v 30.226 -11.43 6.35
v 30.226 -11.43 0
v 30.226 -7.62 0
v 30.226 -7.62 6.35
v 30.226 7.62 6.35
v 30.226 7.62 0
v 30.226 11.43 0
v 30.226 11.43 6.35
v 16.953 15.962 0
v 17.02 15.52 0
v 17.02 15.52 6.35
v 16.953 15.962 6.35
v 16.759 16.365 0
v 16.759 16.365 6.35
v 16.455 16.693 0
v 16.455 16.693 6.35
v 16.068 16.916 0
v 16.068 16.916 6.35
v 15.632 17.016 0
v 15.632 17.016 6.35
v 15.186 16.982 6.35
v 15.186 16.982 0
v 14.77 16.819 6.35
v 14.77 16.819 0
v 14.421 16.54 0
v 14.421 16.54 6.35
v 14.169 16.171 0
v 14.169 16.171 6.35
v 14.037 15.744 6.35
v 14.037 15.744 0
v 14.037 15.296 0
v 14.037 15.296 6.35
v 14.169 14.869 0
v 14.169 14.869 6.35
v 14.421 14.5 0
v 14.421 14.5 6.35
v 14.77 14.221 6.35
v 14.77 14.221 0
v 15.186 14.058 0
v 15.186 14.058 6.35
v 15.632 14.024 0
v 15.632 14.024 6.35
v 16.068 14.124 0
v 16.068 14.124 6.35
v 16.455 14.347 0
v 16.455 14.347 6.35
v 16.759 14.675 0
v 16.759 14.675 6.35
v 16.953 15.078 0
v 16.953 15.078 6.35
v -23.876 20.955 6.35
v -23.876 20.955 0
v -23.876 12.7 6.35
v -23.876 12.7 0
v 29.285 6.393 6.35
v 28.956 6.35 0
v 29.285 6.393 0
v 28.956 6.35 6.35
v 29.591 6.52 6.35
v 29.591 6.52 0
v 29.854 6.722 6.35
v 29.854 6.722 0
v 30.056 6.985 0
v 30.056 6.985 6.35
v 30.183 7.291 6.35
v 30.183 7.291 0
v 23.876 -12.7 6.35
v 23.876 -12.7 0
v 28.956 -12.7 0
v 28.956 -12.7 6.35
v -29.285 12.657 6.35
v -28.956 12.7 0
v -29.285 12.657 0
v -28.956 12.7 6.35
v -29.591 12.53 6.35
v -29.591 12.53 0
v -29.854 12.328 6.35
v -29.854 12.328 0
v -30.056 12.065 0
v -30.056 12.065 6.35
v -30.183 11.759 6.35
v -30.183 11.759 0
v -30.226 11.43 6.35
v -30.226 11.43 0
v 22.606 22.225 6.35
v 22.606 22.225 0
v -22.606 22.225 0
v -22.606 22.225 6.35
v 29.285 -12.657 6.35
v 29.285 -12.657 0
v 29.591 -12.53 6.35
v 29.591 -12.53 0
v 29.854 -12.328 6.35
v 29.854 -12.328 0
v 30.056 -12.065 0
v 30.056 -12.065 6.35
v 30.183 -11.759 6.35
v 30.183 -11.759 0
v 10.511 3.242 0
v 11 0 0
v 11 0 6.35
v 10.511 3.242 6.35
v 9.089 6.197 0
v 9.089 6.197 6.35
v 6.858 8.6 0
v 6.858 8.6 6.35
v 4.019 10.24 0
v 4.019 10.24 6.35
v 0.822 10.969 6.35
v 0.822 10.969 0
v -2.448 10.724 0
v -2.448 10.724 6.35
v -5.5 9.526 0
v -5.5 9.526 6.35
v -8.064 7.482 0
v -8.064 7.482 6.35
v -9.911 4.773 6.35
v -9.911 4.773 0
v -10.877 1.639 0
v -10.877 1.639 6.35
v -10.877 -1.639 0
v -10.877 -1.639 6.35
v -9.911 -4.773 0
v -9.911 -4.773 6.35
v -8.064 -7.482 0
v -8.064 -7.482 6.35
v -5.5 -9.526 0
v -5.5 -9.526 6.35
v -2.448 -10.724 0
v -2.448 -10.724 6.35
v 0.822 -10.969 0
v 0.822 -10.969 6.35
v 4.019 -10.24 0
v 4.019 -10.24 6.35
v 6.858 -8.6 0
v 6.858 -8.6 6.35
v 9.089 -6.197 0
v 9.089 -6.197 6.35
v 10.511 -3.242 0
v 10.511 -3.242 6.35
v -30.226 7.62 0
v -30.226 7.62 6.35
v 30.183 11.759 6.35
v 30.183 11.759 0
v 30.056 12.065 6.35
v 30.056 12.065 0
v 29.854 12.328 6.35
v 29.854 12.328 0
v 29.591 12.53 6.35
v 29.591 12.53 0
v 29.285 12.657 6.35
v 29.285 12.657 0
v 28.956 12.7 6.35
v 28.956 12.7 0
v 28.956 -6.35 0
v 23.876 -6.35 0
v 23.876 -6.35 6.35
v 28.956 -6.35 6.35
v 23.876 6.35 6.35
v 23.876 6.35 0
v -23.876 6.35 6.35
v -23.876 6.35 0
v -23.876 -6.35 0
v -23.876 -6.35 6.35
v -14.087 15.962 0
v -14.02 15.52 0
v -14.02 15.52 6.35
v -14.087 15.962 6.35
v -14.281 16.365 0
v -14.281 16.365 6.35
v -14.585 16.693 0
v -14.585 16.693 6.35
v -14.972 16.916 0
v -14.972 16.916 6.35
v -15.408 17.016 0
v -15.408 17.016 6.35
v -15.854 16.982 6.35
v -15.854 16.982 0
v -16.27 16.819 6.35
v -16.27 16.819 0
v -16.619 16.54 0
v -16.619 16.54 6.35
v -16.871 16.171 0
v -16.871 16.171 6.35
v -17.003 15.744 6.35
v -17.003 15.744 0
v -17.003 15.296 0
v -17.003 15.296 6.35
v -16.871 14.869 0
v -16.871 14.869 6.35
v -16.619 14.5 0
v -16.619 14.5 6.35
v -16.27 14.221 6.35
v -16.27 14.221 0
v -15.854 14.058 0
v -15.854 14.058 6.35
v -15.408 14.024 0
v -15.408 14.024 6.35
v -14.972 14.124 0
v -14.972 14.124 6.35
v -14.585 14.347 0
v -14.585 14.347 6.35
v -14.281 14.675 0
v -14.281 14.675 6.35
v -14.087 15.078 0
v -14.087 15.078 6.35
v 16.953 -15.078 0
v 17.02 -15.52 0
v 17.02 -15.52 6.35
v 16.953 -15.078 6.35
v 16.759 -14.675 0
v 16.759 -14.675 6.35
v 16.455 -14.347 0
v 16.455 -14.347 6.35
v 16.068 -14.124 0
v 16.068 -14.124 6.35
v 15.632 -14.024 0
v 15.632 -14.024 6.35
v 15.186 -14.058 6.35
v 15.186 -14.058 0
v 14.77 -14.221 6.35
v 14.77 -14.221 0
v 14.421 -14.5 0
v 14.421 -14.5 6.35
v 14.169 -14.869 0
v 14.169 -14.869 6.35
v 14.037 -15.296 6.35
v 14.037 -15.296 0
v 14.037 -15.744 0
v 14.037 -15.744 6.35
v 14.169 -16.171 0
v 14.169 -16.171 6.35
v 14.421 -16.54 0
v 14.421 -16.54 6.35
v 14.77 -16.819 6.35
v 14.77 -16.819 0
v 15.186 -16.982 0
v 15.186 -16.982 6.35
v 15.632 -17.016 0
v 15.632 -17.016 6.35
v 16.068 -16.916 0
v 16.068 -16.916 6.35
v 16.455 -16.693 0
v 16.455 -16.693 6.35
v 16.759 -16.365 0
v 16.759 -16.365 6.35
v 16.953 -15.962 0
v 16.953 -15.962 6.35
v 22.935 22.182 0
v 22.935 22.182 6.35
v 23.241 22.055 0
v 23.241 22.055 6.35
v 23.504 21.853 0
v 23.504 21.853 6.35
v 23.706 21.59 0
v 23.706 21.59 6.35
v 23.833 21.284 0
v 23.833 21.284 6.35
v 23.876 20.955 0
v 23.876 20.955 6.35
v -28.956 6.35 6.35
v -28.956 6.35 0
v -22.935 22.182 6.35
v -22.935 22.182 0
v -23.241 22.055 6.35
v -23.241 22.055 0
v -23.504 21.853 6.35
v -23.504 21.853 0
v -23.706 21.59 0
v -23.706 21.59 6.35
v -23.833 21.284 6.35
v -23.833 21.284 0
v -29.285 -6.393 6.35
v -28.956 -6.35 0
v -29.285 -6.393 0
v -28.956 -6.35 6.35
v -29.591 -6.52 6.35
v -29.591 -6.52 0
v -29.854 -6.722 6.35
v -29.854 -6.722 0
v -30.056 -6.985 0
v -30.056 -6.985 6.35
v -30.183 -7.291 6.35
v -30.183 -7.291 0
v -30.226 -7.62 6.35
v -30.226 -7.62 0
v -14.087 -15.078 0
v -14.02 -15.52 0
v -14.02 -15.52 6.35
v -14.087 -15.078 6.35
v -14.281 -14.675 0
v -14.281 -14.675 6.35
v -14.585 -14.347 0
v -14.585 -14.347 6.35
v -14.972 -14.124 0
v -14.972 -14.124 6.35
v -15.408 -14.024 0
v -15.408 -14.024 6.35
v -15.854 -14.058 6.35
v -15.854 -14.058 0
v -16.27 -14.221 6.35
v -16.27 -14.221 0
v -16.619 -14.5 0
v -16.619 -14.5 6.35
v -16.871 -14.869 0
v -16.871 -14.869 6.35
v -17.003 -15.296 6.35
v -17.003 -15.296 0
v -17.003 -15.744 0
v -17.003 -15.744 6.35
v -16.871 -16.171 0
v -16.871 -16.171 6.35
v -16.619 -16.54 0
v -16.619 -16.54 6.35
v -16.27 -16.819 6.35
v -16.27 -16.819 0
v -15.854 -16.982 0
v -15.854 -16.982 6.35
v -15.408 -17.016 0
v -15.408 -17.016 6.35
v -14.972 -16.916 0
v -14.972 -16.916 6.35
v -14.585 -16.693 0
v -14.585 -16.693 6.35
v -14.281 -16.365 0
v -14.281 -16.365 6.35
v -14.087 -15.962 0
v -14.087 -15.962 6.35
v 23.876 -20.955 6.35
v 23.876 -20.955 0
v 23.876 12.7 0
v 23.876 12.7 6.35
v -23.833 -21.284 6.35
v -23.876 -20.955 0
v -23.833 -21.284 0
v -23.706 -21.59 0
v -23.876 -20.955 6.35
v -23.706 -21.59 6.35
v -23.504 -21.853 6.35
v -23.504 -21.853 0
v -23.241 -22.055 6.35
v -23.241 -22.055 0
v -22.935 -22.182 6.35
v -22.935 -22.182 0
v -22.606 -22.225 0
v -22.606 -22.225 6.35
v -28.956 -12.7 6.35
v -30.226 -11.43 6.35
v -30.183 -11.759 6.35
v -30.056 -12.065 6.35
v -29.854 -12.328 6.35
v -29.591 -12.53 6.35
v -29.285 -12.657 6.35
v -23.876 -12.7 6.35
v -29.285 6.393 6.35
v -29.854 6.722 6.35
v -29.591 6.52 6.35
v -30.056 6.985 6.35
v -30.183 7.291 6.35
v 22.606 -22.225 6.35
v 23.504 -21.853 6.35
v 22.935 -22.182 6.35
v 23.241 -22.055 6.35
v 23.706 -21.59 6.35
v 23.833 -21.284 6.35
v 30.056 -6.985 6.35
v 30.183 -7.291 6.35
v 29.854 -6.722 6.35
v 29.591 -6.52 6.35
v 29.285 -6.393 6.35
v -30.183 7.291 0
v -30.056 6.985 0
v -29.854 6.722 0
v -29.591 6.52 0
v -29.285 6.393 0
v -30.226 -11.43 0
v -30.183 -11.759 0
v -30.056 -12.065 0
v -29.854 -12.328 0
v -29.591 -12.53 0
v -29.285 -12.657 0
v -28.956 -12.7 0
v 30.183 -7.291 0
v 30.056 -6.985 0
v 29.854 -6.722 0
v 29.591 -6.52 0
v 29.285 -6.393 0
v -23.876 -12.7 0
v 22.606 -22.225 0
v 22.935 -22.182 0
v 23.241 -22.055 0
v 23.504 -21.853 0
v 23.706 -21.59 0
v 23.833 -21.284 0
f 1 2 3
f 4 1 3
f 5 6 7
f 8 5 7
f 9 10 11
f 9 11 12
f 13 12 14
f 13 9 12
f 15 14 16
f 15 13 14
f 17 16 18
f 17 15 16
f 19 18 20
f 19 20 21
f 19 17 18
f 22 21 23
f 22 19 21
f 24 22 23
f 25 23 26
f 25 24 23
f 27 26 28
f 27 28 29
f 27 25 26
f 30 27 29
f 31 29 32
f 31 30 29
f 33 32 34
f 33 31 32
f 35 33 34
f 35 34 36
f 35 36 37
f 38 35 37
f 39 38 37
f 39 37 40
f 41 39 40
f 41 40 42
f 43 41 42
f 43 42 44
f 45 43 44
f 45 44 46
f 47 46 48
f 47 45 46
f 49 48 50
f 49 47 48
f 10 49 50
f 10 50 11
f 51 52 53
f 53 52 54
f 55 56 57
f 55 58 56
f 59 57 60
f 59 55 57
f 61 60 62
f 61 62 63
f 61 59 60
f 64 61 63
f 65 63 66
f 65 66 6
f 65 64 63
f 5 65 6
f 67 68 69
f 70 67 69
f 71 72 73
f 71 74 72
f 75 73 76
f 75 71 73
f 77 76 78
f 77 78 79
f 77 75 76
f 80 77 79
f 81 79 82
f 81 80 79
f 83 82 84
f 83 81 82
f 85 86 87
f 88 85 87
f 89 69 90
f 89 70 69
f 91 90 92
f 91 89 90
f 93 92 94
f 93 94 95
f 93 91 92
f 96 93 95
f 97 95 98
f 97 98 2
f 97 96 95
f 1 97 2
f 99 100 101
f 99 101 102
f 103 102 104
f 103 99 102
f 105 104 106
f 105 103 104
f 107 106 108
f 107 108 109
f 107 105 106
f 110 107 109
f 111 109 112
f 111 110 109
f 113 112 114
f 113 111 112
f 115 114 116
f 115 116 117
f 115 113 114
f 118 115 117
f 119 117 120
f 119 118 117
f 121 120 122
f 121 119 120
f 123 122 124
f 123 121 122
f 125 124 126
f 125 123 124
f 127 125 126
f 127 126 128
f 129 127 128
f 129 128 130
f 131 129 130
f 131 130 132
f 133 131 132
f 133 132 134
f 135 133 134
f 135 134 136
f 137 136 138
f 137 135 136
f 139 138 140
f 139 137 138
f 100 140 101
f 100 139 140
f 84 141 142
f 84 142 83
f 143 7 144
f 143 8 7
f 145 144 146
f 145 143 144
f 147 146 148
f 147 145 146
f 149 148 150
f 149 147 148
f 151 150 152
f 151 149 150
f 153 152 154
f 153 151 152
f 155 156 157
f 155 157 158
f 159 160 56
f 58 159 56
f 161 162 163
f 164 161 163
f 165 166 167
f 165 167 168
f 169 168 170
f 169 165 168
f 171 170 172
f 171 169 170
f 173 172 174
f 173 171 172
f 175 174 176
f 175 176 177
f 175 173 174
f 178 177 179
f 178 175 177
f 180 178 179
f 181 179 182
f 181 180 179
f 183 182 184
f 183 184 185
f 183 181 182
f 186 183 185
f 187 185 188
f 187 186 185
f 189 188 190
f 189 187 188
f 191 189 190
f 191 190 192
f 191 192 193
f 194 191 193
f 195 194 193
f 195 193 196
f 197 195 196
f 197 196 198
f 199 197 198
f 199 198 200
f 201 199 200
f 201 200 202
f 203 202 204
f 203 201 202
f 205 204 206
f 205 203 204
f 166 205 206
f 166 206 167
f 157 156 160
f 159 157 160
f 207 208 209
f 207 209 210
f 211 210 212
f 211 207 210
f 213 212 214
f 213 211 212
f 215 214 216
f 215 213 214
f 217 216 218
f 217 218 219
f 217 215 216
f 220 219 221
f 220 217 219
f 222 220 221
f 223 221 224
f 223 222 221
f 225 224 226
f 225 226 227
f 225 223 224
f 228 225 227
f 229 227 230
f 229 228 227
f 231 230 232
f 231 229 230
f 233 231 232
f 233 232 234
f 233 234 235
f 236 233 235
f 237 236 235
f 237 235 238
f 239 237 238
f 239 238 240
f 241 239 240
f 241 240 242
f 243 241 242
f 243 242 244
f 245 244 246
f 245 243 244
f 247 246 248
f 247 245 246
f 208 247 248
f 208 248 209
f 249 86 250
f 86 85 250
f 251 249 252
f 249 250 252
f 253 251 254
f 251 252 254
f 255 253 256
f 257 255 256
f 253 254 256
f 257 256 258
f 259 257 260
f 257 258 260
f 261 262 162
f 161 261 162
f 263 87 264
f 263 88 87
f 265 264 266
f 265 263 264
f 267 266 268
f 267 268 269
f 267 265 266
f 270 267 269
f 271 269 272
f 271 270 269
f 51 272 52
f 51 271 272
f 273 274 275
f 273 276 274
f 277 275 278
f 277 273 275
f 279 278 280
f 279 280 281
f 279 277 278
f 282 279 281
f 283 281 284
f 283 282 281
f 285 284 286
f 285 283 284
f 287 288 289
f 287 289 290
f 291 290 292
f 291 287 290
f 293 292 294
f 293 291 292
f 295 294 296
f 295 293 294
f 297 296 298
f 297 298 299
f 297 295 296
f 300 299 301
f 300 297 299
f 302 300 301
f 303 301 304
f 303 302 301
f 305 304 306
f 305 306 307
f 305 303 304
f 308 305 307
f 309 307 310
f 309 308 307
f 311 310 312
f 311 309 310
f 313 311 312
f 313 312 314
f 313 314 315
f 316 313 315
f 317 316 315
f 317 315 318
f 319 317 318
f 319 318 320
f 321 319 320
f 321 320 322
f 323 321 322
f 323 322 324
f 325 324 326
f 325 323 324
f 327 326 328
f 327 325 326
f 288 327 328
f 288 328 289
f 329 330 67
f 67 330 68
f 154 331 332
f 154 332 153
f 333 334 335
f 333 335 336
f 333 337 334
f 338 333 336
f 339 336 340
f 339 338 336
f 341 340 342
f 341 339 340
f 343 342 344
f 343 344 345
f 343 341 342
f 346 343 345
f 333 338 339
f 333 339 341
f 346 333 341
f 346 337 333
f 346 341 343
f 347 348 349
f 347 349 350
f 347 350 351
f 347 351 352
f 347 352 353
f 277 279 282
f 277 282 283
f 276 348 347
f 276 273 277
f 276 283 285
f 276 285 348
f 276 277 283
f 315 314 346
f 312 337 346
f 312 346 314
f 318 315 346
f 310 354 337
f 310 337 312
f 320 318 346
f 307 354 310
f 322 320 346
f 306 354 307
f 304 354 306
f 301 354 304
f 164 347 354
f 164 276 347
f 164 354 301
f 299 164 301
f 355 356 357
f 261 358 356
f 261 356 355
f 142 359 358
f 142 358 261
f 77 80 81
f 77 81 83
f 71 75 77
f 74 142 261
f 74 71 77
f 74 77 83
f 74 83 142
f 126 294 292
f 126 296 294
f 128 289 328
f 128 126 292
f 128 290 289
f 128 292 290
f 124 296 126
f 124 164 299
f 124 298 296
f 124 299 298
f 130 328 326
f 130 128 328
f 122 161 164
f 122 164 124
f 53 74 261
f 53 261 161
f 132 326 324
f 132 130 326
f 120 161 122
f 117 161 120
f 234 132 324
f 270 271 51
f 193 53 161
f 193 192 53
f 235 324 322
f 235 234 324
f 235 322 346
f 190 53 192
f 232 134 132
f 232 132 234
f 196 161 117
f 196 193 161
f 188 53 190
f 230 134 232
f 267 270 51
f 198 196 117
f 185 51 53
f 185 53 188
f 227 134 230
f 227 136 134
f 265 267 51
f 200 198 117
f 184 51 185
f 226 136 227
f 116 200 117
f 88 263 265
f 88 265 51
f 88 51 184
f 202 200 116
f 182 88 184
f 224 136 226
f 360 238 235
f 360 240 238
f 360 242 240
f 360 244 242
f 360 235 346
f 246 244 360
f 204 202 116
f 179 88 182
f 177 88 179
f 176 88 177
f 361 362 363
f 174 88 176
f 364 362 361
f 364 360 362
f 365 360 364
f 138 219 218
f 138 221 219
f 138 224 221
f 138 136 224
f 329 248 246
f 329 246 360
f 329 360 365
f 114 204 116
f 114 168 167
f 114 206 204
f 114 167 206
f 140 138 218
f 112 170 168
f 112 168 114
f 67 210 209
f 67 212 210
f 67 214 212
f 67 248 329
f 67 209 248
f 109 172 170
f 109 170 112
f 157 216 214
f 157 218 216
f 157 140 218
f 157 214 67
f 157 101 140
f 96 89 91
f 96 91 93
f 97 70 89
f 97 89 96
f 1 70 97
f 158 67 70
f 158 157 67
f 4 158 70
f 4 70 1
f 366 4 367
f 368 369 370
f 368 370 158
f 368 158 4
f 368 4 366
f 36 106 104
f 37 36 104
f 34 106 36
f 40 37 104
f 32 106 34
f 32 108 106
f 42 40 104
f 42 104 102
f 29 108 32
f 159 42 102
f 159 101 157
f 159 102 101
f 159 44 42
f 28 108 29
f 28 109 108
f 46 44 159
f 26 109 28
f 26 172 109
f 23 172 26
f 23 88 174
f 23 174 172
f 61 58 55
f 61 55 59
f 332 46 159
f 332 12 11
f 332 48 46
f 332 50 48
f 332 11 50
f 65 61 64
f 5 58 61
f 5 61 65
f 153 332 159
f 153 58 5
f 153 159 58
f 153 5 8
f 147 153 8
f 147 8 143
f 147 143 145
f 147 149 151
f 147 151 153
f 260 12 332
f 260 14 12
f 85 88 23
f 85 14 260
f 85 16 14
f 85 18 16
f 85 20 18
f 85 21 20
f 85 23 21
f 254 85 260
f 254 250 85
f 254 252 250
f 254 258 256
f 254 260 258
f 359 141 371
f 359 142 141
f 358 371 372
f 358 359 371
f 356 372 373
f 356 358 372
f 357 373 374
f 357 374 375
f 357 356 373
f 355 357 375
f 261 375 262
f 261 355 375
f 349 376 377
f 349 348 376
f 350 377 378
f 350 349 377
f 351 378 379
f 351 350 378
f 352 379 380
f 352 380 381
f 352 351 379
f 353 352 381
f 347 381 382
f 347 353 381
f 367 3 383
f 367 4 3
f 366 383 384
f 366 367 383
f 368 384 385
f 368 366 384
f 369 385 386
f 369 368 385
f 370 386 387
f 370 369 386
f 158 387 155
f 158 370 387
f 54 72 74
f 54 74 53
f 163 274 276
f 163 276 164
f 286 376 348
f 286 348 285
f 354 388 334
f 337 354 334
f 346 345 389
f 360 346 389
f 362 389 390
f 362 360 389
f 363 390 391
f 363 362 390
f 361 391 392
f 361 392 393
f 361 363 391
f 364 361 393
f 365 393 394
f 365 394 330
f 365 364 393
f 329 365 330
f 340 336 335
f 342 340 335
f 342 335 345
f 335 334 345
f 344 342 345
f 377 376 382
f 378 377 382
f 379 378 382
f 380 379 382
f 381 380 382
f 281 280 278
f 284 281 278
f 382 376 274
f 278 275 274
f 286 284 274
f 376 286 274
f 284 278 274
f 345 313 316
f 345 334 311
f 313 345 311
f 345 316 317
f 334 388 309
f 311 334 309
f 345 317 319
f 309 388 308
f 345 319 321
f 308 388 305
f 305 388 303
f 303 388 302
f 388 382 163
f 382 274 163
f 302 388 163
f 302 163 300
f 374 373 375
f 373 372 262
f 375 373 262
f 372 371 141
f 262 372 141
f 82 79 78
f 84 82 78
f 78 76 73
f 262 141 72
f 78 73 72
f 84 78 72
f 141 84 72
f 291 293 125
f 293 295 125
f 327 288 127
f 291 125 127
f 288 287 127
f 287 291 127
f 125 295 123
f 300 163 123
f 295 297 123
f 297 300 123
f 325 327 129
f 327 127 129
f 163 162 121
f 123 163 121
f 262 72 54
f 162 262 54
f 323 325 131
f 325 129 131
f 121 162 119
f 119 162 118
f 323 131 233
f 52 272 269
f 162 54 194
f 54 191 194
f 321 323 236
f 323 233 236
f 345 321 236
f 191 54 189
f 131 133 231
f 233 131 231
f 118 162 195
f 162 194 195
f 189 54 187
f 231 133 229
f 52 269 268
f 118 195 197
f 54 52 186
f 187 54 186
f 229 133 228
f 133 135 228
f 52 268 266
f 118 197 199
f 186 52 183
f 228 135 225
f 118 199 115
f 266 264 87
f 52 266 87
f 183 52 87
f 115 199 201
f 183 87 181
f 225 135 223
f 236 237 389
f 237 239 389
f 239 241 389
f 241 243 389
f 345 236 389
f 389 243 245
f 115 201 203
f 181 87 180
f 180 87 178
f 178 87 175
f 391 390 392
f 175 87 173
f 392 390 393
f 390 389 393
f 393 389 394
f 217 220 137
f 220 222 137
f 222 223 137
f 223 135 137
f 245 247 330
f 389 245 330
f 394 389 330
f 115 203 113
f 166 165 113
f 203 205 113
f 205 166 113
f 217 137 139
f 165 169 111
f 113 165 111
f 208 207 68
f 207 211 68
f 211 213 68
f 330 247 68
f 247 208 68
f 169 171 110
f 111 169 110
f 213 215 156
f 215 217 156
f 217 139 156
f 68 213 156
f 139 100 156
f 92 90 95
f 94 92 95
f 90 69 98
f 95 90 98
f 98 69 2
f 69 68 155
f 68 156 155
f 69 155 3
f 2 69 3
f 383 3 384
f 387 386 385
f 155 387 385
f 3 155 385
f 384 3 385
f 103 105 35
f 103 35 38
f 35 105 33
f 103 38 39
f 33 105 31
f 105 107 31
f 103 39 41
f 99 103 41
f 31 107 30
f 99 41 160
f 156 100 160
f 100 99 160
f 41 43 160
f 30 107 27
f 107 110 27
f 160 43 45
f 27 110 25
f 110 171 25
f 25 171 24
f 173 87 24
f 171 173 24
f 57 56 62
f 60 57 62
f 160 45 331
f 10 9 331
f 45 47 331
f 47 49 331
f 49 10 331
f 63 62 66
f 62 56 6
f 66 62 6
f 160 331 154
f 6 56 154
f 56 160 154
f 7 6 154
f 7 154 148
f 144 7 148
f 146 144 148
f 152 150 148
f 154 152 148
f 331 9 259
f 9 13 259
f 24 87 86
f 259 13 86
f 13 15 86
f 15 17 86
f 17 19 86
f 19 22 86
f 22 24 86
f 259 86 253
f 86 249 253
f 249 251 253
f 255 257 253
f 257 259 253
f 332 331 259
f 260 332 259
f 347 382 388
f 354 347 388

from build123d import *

# Parameters (mm, degrees)
F0_R     = 1.49987
F0_R_2   = 11
F0_W     = 6.35
F0_H     = 6.35
F1_DEPTH = 6.35
F2_R     = 1.27


with BuildPart() as f1:
    # F0 (on Top) → F1 (new body)
    with BuildSketch(Plane.XY):
        Polygon((23.876, 22.225), (-23.876, 22.225), (-23.876, 12.7), (-23.876, 6.35), (-23.876, -6.35), (-23.876, -12.7), (-23.876, -22.225), (23.876, -22.225), (23.876, -12.7), (23.876, -6.35), (23.876, 6.35), (23.876, 12.7), align=None)
        with Locations((-15.52, -15.52)):
            Circle(F0_R, mode=Mode.SUBTRACT)
        with Locations((15.52, -15.52)):
            Circle(F0_R, mode=Mode.SUBTRACT)
        with Locations((-15.52, 15.52)):
            Circle(F0_R, mode=Mode.SUBTRACT)
        Circle(F0_R_2, mode=Mode.SUBTRACT)
        with Locations((15.52, 15.52)):
            Circle(F0_R, mode=Mode.SUBTRACT)
        with Locations((-27.051, 9.525)):
            Rectangle(F0_W, F0_H)
        with Locations((27.051, 9.525)):
            Rectangle(F0_W, F0_H)
        with Locations((-27.051, -9.525)):
            Rectangle(F0_W, F0_H)
        with Locations((27.051, -9.525)):
            Rectangle(F0_W, F0_H)
    extrude(amount=F1_DEPTH)

    # F2
    f2_edges = [f1.edges().sort_by_distance(p)[0] for p in [
        (-23.876, -22.225, 3.175),
        (23.876, -22.225, 3.175),
        (23.876, 22.225, 3.175),
        (-23.876, 22.225, 3.175),
        (30.226, -12.7, 3.175),
        (30.226, -6.35, 3.175),
        (30.226, 6.35, 3.175),
        (30.226, 12.7, 3.175),
        (-30.226, 12.7, 3.175),
        (-30.226, 6.35, 3.175),
        (-30.226, -6.35, 3.175),
        (-30.226, -12.7, 3.175),
    ]]
    fillet(f2_edges, radius=F2_R)


solid = f1.part
